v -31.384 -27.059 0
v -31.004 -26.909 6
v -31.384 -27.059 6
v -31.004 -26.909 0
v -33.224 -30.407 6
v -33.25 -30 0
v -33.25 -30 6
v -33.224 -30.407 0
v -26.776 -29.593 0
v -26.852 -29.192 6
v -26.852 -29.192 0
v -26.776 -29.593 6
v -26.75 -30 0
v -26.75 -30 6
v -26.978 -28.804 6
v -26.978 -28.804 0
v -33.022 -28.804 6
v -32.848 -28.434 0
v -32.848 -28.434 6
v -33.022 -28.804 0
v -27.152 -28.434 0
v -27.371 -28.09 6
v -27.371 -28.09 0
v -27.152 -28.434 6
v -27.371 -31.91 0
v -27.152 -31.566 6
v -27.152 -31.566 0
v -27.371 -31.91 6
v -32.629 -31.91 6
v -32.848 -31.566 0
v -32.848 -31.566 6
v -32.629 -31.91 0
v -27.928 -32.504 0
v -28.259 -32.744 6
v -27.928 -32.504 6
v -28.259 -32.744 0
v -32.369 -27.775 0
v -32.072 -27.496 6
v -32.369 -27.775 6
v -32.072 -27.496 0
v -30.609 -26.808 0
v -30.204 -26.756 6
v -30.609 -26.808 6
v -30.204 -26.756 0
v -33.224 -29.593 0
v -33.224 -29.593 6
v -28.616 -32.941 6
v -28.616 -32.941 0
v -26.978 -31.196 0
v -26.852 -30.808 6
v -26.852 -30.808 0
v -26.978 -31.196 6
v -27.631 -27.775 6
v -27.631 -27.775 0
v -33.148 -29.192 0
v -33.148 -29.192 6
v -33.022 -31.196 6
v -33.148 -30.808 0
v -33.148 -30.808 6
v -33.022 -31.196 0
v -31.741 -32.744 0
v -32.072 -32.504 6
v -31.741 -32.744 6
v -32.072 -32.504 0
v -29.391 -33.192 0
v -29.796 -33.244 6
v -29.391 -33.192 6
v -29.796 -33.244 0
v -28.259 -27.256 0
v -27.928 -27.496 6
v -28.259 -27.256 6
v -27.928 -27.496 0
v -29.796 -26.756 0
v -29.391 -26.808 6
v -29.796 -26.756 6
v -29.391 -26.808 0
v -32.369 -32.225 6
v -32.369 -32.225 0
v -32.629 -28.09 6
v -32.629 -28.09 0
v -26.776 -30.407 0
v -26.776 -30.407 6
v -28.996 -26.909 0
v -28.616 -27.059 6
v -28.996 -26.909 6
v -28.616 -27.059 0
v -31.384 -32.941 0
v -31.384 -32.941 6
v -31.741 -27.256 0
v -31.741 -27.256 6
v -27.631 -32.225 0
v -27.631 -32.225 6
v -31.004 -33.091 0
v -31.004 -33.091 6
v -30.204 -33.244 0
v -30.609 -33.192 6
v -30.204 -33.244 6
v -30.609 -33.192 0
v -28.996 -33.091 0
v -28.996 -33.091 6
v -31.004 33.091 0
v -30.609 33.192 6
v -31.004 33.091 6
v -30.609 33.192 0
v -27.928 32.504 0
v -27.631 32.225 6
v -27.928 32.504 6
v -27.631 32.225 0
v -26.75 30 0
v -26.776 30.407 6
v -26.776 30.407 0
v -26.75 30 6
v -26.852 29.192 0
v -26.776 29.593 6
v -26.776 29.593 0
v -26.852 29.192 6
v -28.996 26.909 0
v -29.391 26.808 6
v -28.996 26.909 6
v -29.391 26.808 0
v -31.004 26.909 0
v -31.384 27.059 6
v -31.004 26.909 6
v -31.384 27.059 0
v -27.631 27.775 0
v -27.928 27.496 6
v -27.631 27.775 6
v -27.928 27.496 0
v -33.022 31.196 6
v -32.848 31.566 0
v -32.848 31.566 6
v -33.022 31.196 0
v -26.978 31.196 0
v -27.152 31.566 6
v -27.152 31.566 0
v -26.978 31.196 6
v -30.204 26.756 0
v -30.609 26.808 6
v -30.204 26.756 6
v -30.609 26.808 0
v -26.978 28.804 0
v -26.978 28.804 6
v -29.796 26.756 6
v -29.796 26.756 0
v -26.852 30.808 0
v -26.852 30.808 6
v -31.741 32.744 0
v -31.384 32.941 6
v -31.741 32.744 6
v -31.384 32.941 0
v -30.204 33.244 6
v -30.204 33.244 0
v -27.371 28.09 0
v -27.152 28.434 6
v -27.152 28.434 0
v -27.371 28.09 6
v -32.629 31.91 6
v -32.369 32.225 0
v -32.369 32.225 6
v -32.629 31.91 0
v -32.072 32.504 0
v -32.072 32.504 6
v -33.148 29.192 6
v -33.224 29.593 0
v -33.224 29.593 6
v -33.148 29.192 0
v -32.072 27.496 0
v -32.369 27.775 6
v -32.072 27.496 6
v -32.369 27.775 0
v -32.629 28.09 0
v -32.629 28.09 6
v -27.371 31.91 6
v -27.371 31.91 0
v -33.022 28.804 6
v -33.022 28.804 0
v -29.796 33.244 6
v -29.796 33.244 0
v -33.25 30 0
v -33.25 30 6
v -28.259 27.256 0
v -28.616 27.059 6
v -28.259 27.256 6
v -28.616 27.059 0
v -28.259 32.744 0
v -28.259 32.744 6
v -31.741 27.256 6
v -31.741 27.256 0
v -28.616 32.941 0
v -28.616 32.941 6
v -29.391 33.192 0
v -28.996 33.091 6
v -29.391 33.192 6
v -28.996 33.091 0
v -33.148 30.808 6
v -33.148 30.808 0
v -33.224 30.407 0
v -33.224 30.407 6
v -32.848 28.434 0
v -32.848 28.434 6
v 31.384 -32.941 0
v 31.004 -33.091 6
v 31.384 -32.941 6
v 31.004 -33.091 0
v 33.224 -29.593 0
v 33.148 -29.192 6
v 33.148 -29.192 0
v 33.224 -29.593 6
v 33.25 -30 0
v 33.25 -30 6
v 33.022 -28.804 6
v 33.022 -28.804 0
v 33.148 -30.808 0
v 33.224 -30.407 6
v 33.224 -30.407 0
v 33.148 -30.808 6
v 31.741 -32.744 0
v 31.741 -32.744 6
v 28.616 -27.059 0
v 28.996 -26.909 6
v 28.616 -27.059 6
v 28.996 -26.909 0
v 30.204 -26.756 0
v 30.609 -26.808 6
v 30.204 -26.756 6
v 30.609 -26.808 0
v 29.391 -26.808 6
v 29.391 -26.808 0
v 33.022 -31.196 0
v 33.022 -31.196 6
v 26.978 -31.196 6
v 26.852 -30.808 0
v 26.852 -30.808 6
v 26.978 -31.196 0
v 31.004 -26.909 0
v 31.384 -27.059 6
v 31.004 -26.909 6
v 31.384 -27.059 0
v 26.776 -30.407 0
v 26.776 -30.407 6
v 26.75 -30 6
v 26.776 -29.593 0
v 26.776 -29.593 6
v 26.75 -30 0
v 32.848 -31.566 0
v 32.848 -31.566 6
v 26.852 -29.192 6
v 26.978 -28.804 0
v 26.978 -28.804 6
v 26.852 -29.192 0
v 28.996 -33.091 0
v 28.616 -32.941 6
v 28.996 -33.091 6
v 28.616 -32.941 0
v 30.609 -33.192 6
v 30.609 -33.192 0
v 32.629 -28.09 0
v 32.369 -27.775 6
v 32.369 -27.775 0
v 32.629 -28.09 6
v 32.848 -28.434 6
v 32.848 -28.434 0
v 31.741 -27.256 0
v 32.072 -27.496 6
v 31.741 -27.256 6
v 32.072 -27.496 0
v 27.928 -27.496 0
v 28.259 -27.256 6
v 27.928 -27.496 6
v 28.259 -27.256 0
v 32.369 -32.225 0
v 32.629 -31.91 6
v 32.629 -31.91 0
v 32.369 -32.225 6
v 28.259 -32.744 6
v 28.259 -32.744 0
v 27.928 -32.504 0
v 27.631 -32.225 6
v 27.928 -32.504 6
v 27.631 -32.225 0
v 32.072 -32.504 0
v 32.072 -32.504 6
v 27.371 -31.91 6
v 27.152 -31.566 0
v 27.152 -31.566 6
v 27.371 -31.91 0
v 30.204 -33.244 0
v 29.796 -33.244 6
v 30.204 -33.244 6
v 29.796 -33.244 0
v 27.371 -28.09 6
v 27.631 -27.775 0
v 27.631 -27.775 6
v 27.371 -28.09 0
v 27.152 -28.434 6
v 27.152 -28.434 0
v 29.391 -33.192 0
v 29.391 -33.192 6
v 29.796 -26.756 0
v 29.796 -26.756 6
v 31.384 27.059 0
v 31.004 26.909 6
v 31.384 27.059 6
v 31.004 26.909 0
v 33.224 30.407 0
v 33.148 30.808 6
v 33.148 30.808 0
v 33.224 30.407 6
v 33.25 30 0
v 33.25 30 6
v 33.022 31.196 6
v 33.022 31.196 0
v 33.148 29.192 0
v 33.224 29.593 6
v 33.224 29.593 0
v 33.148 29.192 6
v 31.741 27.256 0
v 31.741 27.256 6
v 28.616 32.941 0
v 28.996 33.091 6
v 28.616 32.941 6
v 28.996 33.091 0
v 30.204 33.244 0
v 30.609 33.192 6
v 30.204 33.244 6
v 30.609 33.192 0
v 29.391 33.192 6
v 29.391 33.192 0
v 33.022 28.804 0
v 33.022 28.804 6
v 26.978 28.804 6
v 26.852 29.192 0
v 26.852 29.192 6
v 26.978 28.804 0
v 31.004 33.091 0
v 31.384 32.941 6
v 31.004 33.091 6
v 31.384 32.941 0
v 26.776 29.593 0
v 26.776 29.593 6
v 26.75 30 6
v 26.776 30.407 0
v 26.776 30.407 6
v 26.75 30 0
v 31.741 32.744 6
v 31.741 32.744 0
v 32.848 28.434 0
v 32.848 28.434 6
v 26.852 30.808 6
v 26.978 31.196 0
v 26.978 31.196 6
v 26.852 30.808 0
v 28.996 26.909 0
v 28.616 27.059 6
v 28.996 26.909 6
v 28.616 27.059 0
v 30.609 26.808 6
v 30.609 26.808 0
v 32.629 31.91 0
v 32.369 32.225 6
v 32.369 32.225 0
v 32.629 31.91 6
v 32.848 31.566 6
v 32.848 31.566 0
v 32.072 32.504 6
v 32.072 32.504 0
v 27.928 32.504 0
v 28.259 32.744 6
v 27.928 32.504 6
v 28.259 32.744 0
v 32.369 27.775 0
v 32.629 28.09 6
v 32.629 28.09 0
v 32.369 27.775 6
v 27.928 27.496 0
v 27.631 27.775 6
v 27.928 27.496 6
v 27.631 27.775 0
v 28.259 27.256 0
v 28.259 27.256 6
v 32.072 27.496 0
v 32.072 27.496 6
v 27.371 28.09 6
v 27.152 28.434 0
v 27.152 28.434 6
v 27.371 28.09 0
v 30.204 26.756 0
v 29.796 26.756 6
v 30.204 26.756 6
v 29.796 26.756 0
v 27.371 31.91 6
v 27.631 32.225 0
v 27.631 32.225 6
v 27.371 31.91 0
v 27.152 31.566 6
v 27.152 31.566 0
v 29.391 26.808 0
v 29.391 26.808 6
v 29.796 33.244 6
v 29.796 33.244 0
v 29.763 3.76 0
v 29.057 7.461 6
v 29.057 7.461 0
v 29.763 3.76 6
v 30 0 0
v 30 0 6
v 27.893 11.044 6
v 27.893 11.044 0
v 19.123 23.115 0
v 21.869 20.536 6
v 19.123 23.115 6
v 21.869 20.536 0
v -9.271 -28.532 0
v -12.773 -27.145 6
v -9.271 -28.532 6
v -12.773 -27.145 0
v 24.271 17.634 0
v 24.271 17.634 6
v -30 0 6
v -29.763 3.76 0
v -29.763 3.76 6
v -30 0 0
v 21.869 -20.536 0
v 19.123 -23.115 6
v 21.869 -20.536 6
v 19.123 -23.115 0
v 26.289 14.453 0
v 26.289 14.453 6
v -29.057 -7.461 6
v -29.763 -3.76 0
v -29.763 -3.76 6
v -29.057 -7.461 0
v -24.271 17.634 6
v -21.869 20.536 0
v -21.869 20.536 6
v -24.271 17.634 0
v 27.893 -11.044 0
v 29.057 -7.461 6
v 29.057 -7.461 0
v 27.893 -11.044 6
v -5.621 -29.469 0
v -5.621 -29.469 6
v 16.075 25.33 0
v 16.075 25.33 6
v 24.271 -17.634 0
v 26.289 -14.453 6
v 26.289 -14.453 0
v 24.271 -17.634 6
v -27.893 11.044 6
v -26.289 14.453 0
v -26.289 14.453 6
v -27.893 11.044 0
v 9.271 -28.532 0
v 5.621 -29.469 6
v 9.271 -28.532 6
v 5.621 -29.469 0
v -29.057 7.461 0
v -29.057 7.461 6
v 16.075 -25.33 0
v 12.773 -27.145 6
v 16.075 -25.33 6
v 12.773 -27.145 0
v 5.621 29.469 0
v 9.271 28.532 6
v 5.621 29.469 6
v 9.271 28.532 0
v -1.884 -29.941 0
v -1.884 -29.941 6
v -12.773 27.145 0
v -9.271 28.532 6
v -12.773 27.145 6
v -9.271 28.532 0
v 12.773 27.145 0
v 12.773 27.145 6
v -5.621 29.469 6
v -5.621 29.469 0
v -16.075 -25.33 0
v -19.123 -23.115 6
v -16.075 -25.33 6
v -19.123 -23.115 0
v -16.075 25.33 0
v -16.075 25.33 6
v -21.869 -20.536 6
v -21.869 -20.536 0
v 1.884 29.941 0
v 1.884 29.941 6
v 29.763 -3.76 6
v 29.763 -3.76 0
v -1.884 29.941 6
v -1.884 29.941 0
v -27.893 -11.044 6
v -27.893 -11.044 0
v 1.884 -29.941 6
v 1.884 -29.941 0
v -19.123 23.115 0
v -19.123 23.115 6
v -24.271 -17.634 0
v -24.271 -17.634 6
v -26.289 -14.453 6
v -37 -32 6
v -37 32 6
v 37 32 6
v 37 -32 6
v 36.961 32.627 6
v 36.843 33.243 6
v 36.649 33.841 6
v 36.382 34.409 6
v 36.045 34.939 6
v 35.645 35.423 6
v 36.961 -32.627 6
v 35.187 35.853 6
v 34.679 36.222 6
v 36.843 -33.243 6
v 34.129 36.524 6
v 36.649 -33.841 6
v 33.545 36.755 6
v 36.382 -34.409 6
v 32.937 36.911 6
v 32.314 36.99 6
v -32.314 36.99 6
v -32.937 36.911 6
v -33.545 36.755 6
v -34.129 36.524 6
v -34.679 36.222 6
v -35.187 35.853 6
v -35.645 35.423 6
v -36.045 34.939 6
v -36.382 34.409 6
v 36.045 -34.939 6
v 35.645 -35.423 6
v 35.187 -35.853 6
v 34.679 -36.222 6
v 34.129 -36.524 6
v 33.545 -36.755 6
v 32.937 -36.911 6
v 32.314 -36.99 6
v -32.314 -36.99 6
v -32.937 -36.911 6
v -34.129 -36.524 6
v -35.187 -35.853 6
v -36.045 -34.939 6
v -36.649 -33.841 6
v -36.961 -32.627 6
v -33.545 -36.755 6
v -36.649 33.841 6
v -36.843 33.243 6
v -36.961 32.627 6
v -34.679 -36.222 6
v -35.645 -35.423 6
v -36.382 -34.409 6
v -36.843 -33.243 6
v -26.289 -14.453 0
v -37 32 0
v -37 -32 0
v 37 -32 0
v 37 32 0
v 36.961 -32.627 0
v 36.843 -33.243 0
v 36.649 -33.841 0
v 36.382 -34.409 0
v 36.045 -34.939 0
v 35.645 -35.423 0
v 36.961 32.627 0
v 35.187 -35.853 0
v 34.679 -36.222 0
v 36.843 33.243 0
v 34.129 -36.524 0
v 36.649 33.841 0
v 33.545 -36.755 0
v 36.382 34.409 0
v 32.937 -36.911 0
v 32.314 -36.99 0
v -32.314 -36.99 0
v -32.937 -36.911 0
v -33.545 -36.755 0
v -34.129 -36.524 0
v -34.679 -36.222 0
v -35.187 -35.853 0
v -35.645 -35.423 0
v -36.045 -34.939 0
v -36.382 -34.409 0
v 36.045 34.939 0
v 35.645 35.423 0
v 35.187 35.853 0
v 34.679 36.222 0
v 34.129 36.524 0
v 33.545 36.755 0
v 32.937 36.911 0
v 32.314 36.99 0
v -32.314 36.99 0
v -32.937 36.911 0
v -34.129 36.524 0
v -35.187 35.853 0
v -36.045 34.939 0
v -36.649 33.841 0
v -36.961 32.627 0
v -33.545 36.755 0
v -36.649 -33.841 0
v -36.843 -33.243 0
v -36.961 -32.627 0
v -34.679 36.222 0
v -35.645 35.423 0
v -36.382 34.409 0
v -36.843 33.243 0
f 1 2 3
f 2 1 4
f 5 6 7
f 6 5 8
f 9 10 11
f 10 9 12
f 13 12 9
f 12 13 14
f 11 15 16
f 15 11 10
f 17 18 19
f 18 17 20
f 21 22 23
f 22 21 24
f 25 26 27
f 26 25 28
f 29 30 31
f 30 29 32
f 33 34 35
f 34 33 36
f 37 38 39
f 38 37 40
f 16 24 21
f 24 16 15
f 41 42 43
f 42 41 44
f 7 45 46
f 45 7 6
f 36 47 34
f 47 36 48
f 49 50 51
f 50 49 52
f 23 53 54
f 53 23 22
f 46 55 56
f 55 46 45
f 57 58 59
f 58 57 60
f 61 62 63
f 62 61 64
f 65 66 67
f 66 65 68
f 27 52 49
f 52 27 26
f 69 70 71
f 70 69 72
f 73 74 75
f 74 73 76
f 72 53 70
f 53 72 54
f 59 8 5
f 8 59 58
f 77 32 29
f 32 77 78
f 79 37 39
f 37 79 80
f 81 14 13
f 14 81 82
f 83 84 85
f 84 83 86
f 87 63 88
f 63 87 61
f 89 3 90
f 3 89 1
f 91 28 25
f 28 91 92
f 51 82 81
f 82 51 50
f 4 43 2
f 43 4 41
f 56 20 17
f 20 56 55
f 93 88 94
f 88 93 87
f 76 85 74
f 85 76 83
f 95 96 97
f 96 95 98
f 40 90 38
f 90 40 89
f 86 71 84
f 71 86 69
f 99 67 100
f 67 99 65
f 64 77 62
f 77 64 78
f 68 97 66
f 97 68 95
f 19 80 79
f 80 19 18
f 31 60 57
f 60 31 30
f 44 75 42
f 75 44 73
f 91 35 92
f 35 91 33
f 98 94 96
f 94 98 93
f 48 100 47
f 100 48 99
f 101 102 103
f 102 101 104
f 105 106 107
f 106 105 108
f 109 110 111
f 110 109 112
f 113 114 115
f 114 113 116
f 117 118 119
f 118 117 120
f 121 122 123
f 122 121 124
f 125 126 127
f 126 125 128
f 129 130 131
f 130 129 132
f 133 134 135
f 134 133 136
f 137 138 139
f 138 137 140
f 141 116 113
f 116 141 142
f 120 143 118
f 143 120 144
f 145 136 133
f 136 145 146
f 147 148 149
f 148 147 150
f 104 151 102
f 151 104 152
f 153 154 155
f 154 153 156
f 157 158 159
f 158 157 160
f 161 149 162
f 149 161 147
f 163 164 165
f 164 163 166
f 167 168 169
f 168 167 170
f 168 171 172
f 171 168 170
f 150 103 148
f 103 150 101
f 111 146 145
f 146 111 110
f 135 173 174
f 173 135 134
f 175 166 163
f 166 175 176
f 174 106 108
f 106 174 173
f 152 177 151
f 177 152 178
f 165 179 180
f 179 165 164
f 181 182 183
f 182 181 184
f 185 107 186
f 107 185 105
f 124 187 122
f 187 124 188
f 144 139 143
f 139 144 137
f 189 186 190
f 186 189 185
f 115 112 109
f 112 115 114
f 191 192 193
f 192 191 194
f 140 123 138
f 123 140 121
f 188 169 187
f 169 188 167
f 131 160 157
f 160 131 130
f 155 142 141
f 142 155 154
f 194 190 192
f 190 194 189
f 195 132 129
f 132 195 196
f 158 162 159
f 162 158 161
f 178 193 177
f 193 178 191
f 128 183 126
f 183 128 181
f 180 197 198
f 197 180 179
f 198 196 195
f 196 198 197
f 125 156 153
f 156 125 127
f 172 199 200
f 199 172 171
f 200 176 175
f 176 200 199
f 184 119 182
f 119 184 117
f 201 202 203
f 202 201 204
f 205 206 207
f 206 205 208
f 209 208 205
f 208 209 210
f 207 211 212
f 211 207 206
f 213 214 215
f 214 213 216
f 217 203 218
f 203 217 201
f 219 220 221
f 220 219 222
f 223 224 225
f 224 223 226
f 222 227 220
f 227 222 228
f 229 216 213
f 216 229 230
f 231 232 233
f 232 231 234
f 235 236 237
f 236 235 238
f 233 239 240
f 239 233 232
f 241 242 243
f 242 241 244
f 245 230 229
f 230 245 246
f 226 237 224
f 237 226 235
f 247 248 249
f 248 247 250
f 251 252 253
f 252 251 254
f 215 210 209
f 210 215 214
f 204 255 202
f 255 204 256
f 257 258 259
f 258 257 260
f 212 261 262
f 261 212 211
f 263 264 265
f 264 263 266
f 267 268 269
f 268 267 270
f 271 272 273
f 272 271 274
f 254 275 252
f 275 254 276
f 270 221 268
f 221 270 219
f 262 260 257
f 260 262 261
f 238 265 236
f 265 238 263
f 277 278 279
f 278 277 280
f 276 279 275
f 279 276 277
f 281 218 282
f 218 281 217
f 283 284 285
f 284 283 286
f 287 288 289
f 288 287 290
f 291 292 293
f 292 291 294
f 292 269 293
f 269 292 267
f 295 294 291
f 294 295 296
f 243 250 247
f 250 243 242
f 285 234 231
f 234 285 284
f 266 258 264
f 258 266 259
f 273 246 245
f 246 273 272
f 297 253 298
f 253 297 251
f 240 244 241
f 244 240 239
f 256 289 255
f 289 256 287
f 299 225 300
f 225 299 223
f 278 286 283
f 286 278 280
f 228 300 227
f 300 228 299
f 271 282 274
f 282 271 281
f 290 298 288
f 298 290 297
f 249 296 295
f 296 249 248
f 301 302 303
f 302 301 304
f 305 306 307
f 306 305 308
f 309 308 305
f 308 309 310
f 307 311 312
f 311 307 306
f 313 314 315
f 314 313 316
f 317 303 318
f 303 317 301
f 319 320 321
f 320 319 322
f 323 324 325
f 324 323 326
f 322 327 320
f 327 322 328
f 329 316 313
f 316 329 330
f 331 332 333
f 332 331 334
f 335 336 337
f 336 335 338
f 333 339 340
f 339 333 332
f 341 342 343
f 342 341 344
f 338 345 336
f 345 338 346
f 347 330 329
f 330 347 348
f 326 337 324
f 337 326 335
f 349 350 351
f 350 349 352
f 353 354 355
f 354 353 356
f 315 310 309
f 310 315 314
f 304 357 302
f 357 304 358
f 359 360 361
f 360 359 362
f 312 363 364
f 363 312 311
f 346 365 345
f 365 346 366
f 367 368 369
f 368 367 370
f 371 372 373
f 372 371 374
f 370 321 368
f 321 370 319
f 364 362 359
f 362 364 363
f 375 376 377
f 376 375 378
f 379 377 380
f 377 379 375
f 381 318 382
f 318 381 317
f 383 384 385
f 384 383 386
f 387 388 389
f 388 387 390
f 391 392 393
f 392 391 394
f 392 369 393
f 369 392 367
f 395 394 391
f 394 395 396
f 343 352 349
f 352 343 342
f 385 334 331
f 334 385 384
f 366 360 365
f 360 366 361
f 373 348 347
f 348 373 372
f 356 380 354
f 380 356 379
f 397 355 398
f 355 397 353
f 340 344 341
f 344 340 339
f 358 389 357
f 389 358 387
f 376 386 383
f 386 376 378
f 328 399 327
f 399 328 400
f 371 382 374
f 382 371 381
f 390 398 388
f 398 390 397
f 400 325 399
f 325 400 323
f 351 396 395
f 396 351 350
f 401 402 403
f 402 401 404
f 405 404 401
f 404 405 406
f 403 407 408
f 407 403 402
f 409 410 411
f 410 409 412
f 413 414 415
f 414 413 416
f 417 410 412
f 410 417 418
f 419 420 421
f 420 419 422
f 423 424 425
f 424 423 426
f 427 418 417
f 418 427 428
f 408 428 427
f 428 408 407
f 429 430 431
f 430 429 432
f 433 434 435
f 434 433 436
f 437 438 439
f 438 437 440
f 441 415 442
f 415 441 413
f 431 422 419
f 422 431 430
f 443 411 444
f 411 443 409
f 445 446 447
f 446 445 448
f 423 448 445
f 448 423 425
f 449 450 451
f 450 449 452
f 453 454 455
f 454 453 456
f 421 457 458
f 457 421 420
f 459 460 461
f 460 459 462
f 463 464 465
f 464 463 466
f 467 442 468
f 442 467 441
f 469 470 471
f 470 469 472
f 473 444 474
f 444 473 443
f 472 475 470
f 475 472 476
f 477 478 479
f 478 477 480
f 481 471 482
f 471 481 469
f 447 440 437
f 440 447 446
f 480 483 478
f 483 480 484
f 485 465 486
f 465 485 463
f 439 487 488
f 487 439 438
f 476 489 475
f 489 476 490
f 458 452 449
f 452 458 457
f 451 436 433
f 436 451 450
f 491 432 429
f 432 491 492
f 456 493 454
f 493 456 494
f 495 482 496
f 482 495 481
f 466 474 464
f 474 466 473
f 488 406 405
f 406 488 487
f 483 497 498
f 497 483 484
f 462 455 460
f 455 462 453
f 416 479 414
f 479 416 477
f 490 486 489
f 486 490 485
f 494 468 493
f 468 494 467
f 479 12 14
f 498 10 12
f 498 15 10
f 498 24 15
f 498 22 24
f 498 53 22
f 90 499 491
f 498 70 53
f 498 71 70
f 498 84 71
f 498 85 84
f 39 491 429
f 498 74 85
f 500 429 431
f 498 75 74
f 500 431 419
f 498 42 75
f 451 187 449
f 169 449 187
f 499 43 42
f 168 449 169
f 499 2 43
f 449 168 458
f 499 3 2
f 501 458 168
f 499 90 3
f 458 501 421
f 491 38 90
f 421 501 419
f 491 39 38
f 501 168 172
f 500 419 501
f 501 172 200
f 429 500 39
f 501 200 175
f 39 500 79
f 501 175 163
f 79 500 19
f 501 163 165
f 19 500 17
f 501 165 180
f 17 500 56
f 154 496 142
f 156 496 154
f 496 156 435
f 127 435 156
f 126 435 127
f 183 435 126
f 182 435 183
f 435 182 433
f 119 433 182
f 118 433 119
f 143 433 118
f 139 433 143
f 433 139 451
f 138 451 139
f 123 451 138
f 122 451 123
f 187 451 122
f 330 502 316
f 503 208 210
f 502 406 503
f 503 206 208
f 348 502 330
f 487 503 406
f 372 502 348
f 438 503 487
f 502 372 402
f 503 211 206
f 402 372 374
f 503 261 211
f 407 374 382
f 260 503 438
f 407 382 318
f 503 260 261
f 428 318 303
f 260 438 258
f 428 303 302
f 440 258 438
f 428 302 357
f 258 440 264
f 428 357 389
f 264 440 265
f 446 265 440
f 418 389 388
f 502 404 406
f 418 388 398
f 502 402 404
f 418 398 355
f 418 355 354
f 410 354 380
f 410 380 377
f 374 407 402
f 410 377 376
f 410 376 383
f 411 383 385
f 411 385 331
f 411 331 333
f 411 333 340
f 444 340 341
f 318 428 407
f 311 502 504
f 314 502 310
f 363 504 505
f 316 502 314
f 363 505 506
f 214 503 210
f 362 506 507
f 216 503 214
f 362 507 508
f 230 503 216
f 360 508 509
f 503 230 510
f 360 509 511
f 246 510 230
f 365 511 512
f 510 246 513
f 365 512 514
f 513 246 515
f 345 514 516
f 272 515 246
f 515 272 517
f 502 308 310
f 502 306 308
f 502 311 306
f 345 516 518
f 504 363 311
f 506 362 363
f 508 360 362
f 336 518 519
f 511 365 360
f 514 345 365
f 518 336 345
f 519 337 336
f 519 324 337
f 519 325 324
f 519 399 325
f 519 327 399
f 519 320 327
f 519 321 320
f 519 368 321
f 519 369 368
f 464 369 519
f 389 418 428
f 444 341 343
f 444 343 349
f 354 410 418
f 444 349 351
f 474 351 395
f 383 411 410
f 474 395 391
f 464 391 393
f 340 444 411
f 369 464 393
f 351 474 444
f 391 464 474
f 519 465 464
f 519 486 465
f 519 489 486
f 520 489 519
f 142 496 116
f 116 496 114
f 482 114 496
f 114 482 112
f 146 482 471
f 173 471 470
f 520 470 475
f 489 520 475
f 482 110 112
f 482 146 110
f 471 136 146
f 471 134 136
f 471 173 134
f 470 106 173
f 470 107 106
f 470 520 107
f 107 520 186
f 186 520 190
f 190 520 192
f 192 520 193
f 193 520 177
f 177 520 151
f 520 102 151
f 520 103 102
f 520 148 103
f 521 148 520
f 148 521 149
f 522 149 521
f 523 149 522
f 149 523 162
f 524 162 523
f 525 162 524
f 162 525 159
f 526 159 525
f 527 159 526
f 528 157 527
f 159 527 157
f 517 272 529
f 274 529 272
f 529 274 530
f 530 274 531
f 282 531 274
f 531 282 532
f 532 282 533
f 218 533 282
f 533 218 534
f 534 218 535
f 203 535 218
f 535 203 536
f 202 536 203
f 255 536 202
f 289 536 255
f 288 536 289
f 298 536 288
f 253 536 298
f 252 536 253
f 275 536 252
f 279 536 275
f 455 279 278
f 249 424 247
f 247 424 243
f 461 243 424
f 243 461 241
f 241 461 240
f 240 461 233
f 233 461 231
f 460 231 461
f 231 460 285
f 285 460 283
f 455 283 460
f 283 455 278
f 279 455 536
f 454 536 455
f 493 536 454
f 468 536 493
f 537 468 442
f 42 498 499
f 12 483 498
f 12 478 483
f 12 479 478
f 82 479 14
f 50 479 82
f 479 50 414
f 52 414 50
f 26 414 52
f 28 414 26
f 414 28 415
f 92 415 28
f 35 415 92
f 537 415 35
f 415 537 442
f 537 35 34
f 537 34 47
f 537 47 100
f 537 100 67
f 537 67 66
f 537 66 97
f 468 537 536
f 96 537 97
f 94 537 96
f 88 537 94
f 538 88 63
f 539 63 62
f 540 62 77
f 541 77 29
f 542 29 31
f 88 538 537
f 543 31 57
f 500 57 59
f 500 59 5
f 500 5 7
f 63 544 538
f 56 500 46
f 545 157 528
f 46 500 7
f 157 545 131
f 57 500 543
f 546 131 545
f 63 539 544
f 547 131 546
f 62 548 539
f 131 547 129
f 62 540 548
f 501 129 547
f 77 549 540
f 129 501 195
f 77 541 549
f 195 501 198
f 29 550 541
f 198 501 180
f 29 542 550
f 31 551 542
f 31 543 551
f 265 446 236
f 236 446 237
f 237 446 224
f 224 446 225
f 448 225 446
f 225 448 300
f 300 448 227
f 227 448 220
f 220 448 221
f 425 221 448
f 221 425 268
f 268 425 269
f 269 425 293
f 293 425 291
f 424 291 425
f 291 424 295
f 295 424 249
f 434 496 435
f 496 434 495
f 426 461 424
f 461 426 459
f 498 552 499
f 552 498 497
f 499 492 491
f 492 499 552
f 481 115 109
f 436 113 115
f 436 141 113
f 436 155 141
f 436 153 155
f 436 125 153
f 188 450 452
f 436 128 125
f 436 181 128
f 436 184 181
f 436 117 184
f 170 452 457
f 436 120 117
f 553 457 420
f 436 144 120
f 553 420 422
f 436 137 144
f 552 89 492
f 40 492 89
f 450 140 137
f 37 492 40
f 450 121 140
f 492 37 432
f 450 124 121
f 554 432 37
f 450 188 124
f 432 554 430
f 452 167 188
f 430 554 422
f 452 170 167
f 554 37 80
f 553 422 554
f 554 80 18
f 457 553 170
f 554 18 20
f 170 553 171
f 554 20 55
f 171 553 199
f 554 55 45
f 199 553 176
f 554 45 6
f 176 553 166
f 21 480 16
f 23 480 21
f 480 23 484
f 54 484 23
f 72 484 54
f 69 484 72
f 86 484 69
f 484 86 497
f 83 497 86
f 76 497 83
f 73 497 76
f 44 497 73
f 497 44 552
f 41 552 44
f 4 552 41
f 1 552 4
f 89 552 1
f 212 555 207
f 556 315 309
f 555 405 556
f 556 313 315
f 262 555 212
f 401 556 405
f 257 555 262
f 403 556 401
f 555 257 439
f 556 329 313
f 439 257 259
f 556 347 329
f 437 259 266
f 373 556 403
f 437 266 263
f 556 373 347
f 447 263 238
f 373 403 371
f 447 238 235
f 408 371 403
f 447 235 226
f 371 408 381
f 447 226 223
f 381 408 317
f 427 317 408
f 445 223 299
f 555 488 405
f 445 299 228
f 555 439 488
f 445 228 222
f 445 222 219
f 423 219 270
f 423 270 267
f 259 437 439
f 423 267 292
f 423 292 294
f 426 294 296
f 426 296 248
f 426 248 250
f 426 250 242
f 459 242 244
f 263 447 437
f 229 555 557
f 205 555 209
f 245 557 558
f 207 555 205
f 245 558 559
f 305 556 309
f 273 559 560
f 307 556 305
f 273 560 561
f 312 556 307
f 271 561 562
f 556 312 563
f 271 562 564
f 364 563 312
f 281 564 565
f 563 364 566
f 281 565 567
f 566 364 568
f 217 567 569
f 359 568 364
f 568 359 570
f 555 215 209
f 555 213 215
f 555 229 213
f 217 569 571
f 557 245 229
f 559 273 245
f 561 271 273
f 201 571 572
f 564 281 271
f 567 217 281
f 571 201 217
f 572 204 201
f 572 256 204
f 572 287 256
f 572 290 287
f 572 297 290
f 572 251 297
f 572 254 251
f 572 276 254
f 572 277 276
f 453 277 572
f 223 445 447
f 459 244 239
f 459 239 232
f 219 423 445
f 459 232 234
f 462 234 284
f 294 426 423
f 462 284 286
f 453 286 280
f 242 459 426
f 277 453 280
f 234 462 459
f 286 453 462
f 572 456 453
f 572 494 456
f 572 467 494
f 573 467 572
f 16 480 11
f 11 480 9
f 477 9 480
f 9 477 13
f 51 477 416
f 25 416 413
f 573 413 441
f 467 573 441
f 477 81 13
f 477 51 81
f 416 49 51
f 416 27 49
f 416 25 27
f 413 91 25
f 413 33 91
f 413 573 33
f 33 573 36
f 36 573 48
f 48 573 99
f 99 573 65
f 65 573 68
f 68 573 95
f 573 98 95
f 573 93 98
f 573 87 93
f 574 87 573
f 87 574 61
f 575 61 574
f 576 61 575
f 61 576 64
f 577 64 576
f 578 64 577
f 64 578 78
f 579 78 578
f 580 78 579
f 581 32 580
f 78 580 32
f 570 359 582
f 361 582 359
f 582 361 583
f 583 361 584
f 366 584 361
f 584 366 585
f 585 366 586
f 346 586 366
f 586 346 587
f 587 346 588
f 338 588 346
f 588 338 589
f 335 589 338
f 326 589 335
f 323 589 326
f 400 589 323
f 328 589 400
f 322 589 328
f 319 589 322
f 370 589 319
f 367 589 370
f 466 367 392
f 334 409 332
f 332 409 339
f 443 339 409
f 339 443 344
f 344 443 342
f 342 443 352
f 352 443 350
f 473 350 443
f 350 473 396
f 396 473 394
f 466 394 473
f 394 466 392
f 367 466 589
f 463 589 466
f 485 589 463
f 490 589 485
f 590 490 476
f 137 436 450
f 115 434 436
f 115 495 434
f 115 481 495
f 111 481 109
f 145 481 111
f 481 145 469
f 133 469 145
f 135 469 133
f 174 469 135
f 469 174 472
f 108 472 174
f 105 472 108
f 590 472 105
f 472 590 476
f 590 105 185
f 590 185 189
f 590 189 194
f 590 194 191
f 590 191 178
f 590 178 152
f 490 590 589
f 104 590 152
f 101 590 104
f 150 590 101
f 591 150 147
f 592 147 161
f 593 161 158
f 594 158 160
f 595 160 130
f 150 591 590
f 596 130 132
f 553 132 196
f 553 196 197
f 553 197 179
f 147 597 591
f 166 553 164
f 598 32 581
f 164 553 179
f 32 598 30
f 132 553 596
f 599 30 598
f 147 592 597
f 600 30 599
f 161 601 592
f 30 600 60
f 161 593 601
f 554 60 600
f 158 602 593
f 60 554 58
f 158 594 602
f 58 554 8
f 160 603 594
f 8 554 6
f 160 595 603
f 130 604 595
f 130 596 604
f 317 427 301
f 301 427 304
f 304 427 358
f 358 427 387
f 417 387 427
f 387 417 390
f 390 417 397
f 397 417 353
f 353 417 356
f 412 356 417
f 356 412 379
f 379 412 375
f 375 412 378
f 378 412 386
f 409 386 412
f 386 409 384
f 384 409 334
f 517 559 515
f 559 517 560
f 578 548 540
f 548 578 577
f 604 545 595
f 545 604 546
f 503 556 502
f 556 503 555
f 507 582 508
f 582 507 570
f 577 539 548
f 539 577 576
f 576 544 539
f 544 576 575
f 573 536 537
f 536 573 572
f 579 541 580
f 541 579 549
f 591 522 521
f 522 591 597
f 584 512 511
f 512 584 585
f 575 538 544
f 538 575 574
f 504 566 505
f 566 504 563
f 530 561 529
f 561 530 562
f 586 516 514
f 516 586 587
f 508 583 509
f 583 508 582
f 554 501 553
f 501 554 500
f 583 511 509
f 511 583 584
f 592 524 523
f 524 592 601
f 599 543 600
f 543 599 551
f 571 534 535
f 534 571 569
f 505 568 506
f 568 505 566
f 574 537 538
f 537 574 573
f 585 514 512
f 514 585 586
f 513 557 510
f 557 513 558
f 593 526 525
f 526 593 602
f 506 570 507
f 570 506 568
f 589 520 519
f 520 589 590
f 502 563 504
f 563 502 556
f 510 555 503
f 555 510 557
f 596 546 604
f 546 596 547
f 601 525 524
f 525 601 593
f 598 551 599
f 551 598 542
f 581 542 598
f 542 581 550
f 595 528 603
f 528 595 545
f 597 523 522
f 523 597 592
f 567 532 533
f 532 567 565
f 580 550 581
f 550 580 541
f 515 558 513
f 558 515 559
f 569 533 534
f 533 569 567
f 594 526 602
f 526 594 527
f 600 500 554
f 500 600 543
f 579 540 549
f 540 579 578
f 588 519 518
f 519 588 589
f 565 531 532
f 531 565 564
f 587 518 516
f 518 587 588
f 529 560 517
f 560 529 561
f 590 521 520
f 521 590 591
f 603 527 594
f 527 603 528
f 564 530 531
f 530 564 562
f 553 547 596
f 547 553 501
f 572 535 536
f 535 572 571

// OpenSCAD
$fn = 50;


difference() {
	union() {
		hull() {
			translate(v = [-32.0000000000, 32.0000000000, 0]) {
				cylinder(h = 6, r = 5);
			}
			translate(v = [32.0000000000, 32.0000000000, 0]) {
				cylinder(h = 6, r = 5);
			}
			translate(v = [-32.0000000000, -32.0000000000, 0]) {
				cylinder(h = 6, r = 5);
			}
			translate(v = [32.0000000000, -32.0000000000, 0]) {
				cylinder(h = 6, r = 5);
			}
		}
	}
	union() {
		#translate(v = [-30.0000000000, -30.0000000000, -100.0000000000]) {
			cylinder(h = 200, r = 3.2500000000);
		}
		#translate(v = [-30.0000000000, 30.0000000000, -100.0000000000]) {
			cylinder(h = 200, r = 3.2500000000);
		}
		#translate(v = [30.0000000000, -30.0000000000, -100.0000000000]) {
			cylinder(h = 200, r = 3.2500000000);
		}
		#translate(v = [30.0000000000, 30.0000000000, -100.0000000000]) {
			cylinder(h = 200, r = 3.2500000000);
		}
		#cylinder(h = 6, r = 30.0000000000);
	}
}
